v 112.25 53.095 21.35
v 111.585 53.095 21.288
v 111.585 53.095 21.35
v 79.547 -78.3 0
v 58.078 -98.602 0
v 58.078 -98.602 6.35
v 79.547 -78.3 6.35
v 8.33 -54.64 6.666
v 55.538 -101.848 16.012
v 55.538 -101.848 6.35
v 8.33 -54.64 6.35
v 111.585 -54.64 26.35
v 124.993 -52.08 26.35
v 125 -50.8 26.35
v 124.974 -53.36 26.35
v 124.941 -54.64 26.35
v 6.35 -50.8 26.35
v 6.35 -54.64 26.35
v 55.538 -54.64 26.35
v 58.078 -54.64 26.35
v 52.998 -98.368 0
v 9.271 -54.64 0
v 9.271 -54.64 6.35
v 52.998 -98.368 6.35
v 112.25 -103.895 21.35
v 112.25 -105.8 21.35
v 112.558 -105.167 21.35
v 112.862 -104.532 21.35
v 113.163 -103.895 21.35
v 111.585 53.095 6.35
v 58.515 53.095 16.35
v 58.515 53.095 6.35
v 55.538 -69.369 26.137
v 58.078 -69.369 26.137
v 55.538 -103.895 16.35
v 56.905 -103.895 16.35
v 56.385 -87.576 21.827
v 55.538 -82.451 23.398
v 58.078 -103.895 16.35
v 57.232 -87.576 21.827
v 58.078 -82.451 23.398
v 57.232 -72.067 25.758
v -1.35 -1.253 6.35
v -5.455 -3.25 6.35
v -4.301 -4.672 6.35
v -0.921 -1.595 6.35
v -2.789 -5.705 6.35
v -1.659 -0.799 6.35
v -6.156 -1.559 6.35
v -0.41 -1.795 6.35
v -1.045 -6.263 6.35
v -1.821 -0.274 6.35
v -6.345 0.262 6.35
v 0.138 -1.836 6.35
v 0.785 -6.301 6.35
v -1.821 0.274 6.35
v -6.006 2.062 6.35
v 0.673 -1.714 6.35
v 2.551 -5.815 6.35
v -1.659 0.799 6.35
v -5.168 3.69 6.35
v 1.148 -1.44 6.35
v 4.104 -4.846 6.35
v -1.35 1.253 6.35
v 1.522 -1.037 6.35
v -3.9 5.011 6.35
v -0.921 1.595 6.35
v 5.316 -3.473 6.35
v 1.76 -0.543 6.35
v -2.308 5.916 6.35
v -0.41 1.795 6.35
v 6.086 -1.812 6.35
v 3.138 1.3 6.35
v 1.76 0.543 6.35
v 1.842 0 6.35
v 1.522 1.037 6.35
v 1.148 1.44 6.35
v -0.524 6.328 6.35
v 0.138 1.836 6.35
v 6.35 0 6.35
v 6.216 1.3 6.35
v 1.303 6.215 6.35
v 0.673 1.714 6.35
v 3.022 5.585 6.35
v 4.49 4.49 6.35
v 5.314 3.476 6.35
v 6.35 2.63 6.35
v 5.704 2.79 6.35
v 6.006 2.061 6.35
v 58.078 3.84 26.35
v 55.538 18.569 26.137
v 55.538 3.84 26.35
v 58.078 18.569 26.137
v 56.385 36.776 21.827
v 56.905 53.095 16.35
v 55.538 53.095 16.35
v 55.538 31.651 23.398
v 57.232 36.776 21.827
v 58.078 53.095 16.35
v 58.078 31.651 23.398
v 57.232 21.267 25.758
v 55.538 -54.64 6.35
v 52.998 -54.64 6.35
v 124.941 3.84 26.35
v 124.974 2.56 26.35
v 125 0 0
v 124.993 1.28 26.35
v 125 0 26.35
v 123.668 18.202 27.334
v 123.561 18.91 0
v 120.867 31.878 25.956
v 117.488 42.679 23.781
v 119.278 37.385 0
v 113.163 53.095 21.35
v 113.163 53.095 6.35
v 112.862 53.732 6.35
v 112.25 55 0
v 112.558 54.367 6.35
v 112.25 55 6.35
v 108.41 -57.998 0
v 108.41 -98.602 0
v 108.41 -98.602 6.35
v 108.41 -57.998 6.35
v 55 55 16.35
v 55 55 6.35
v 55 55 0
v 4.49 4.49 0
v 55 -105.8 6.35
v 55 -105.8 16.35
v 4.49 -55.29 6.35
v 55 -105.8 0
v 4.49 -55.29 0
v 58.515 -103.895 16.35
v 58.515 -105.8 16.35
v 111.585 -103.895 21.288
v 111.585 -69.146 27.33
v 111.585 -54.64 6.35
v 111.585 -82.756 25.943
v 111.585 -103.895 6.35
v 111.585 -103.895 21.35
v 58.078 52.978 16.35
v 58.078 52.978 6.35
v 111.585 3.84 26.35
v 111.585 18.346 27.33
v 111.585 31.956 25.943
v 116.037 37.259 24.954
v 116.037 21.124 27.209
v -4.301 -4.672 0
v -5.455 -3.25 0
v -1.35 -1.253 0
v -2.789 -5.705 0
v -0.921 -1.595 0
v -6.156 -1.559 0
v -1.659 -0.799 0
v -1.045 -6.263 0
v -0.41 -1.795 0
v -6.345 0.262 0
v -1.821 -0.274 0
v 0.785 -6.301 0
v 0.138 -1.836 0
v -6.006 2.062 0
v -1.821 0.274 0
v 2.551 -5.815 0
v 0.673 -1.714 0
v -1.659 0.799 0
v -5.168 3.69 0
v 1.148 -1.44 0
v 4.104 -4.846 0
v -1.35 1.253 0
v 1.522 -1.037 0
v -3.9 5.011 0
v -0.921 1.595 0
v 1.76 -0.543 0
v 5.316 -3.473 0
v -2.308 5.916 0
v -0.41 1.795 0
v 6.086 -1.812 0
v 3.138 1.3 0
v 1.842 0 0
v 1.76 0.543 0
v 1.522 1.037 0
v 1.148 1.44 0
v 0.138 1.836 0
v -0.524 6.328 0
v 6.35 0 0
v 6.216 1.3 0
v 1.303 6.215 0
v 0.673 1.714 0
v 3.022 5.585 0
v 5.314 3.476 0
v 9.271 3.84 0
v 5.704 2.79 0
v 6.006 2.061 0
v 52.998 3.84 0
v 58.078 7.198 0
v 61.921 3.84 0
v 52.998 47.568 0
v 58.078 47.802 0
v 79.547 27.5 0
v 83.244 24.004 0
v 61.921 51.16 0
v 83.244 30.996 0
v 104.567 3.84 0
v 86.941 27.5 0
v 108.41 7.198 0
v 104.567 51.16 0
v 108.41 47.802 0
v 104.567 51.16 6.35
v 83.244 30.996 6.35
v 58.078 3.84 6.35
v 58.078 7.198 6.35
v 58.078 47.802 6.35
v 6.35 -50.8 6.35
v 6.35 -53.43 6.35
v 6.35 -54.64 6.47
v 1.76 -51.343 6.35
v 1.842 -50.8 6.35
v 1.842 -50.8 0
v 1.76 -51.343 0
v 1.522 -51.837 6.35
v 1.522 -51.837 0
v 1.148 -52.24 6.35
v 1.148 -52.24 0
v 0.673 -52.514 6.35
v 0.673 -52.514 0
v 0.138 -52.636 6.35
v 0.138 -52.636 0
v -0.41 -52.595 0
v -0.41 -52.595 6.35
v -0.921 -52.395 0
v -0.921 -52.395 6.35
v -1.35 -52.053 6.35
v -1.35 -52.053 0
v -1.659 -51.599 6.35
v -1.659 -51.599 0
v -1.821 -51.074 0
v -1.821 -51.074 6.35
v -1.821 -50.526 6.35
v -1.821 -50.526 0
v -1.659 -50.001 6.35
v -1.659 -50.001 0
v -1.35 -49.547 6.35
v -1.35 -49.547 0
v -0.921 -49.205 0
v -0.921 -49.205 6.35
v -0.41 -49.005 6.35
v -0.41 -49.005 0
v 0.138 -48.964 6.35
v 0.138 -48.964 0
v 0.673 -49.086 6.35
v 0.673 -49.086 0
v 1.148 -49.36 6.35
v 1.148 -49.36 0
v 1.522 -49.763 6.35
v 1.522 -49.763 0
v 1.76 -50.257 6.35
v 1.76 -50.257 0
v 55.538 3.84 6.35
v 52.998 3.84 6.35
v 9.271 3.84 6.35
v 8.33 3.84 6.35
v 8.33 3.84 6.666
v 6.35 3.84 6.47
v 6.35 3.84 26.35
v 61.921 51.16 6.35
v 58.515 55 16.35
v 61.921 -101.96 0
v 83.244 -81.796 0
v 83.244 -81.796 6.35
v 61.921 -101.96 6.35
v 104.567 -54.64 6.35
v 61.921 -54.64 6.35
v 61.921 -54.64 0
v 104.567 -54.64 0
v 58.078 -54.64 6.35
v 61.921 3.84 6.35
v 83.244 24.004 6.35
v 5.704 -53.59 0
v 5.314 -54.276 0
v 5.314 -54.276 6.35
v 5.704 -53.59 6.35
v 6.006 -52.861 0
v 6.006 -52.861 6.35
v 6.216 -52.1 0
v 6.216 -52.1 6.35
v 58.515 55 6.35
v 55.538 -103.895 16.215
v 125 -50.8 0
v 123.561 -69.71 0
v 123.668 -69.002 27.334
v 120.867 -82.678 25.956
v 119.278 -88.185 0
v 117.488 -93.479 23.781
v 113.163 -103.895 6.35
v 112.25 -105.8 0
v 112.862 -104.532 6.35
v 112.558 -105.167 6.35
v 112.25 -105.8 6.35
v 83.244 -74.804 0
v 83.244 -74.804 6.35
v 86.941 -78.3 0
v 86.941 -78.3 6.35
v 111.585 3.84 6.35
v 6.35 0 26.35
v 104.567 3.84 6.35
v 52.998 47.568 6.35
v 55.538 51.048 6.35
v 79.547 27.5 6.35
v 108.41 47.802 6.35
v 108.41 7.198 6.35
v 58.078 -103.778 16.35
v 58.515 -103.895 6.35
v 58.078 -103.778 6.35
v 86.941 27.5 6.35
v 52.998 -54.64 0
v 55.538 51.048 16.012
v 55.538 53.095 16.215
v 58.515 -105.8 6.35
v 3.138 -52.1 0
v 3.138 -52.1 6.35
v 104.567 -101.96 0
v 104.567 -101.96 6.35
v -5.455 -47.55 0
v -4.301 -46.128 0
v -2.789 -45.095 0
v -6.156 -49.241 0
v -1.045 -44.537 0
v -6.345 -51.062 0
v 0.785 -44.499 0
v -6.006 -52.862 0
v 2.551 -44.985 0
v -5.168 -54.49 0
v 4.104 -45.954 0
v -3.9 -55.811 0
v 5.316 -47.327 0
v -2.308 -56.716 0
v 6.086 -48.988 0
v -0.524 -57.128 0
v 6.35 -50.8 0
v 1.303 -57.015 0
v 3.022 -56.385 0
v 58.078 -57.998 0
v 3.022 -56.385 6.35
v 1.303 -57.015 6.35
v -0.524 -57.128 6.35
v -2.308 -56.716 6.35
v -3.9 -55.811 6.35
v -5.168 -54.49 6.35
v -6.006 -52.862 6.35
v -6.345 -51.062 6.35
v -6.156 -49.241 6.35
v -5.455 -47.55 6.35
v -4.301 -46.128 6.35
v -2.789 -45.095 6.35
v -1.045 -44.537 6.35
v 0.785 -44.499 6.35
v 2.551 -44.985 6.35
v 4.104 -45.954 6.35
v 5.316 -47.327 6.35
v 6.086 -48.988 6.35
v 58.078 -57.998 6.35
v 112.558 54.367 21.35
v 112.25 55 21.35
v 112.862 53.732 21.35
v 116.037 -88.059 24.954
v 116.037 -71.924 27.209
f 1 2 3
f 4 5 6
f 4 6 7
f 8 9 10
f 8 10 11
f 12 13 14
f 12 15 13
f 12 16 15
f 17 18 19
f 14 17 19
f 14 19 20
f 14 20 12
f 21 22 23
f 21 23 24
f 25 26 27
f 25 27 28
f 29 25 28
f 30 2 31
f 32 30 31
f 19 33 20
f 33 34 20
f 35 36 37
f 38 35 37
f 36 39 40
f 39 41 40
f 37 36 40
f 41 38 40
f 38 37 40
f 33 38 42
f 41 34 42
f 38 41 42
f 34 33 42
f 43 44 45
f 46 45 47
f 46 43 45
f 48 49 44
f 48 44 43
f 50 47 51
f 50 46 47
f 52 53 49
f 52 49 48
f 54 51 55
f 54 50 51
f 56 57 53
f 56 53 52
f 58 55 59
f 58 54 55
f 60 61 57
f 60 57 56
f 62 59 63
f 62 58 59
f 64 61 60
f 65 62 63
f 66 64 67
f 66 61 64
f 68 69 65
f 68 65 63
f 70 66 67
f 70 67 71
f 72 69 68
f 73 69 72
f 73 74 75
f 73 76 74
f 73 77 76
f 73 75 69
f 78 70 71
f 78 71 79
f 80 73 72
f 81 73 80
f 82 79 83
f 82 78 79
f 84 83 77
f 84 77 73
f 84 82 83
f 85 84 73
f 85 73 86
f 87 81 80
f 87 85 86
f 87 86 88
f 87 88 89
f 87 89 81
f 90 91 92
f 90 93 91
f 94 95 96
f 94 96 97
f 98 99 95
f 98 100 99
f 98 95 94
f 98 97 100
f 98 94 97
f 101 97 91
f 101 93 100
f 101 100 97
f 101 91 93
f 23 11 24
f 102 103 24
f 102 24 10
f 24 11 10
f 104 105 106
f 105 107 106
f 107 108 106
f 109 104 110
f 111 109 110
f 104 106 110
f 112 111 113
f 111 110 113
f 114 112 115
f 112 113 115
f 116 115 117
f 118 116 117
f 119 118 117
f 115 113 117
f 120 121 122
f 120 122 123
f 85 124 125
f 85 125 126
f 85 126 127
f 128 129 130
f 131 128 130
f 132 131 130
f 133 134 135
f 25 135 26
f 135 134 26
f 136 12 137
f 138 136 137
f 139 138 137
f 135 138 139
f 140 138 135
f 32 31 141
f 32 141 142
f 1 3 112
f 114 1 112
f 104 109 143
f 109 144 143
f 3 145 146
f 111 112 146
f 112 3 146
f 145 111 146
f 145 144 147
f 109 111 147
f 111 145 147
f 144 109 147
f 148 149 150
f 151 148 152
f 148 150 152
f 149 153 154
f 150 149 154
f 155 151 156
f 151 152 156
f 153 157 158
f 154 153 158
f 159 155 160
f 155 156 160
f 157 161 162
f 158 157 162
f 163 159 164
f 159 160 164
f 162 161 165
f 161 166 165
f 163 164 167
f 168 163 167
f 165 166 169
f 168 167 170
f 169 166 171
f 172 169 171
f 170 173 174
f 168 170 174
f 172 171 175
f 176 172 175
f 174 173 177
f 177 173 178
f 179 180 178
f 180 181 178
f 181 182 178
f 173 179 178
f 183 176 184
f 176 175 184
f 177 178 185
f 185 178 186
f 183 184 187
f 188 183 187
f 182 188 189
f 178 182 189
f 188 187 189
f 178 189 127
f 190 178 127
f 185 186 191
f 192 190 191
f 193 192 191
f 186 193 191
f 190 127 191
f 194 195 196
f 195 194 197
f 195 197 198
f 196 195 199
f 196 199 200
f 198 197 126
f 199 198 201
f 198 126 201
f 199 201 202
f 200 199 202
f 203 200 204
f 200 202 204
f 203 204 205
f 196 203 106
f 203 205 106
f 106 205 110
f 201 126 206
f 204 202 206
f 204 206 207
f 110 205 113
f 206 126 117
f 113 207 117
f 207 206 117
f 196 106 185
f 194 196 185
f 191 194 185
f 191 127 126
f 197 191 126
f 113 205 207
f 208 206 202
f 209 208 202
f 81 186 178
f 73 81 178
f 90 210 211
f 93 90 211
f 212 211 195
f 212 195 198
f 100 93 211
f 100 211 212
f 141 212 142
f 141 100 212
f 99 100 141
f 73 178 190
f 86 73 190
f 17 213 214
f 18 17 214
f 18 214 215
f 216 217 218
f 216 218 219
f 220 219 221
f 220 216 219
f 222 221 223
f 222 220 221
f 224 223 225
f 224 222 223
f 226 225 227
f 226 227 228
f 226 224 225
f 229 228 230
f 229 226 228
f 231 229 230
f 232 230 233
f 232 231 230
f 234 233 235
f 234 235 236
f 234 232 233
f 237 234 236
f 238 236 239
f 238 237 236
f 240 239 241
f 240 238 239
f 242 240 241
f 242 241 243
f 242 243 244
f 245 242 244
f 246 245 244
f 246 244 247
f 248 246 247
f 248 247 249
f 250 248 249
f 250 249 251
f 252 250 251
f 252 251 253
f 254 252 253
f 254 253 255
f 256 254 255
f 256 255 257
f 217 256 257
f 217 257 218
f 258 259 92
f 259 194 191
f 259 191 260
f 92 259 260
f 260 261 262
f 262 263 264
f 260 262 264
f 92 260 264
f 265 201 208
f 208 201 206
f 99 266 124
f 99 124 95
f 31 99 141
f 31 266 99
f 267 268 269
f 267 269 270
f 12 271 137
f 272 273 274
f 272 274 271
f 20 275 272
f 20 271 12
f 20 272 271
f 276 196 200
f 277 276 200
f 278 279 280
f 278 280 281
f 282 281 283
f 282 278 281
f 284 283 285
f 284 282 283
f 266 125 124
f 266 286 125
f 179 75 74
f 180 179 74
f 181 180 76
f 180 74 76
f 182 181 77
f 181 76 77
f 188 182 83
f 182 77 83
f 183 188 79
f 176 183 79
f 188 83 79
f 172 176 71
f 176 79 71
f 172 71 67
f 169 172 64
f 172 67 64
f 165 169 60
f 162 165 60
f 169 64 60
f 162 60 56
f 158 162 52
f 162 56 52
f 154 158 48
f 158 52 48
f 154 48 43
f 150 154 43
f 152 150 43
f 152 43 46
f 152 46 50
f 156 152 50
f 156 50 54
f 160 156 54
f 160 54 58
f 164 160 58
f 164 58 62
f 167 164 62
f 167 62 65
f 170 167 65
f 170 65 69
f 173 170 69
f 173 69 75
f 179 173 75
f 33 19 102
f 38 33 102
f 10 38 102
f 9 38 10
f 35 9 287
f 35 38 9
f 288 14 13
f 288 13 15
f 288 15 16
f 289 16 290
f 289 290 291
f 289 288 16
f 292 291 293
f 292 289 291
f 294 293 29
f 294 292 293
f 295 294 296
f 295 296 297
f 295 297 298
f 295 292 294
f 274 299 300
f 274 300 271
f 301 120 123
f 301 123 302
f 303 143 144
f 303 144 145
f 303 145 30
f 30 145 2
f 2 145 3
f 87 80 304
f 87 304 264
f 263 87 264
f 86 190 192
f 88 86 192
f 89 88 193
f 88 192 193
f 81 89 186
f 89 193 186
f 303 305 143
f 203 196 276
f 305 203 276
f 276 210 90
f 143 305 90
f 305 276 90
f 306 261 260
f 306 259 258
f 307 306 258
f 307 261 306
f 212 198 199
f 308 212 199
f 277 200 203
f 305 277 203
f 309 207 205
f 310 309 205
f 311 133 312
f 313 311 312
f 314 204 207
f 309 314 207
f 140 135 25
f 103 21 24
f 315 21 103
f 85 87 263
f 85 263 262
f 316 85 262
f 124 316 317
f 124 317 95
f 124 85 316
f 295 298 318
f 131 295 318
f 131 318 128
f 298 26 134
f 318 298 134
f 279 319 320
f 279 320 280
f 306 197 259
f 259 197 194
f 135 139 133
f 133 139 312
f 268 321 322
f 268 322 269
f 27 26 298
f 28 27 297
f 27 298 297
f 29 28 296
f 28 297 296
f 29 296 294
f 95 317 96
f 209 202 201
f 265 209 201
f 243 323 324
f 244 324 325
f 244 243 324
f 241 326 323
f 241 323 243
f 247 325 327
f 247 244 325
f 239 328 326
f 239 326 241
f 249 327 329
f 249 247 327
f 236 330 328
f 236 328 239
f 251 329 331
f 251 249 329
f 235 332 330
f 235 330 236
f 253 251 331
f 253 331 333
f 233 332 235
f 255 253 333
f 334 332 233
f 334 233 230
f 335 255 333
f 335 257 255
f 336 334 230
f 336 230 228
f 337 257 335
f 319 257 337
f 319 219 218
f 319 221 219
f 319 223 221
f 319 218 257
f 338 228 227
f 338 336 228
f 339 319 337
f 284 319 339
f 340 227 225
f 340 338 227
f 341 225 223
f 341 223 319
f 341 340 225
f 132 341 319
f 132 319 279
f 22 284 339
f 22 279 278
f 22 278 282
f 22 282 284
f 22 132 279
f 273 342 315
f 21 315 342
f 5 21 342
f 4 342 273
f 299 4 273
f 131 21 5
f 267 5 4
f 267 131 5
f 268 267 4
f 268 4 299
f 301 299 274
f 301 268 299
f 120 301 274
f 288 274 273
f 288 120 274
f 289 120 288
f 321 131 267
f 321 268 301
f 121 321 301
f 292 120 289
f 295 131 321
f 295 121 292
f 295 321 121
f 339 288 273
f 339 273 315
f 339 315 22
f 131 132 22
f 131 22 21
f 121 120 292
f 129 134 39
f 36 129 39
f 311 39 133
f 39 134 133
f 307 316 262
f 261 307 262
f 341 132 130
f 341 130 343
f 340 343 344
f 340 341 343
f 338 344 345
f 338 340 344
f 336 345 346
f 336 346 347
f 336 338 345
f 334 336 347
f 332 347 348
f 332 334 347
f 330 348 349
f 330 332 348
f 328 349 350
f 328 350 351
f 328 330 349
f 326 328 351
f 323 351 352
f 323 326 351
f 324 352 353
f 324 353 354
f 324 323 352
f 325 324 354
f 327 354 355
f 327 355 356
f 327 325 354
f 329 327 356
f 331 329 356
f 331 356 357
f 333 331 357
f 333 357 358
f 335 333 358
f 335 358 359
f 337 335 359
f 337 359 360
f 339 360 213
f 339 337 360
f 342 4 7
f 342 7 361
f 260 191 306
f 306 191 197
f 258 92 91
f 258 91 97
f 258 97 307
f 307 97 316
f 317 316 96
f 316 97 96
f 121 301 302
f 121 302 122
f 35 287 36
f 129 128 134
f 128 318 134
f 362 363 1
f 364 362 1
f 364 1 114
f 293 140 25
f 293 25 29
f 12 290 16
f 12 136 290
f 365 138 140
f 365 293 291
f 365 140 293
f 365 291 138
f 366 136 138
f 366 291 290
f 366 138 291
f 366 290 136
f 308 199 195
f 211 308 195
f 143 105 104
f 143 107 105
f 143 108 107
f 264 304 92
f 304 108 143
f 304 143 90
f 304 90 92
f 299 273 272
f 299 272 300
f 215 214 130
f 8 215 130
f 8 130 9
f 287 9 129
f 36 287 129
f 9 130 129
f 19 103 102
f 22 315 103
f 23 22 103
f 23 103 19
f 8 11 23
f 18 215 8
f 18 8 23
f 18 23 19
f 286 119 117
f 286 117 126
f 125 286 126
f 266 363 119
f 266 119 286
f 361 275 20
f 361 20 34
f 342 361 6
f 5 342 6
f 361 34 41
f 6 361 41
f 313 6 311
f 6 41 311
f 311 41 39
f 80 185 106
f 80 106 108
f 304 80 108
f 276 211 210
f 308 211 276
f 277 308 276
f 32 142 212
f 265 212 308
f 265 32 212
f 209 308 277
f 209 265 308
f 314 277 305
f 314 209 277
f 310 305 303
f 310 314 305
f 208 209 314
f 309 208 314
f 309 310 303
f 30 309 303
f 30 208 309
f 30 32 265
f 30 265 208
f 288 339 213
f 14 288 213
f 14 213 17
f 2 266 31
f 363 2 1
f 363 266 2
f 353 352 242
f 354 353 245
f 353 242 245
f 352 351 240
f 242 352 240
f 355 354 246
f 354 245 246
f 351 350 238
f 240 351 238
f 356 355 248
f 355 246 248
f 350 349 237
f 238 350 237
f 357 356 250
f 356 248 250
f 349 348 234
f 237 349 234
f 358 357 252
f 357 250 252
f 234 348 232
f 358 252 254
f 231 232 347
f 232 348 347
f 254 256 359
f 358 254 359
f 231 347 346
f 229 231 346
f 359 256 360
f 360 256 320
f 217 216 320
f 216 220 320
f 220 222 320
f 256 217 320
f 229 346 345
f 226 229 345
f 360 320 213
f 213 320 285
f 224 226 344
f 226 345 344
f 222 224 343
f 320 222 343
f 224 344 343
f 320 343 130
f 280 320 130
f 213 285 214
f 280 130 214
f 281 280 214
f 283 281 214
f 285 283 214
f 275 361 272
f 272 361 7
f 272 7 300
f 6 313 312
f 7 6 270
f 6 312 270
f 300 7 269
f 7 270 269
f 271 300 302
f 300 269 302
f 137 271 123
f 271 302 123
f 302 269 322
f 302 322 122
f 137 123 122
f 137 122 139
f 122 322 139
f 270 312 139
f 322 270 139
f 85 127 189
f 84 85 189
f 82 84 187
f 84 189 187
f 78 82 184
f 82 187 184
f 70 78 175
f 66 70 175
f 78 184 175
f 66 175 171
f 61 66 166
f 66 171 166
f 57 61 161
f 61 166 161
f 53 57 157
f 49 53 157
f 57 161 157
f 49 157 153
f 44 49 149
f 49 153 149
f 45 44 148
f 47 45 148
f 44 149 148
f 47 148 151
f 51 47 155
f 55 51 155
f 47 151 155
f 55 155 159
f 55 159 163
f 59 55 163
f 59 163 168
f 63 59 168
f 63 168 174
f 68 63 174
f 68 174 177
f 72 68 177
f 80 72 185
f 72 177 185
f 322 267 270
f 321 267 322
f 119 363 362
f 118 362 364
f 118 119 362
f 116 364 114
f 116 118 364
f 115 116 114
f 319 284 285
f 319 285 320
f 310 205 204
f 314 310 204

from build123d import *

# Parameters (mm, degrees)
F1_DEPTH       = 6.35
F2_R           = 1.8415
F3_DEPTH       = 25.4
F4_W           = 2.9205800795
F4_H           = 3.84
F5_DEPTH       = 20
F7_DEPTH       = 3.175
F9_DEPTH       = 1.905
F7_FACE_W      = 3.175
F7_FACE_H      = 10
F9_FACE_W      = 1.905
F9_FACE_H      = 10
F12_DEPTH      = 2.54
F16_END_RADIUS = 125
F15_W          = 3.84
F15_H          = 20
F16_REACH      = 136.0957238483
F18_DEPTH      = 15
F21_END_RADIUS = 125
F21_REACH      = 66.9646272281
F23_END_RADIUS = 125
F22_W          = 3.84
F22_H          = 20
F23_REACH      = 136.0957238483


with BuildPart() as f1:
    # F0 (on Top) → F1 (new body)
    with BuildSketch(Plane.XY):
        with BuildLine():
            Line((6.35, 0), (0, 0))
            Line((0, 0), (4.4901280605, 4.4901280605))
            ThreePointArc((4.4901280605, 4.4901280605), (-5.8666350314, -2.4300397955), (6.35, 0))
        make_face()
        with BuildLine():
            Line((4.4901280605, 4.4901280605), (0, 0))
            Line((0, 0), (6.35, 0))
            ThreePointArc((6.35, 0), (6.3162867067, 0.6534693866), (6.2155048065, 1.3))
            Line((6.2155048065, 1.3), (3.1384776311, 1.3))
            Line((3.1384776311, 1.3), (5.3142644127, 3.4757867817))
            ThreePointArc((5.3142644127, 3.4757867817), (4.9283617968, 4.0042165276), (4.4901280605, 4.4901280605))
        make_face()
        with BuildLine():
            Line((55, 55), (4.4901280605, 4.4901280605))
            ThreePointArc((4.4901280605, 4.4901280605), (4.9283617968, 4.0042165276), (5.3142644127, 3.4757867817))
            Line((5.3142644127, 3.4757867817), (55.5384776311, 53.7))
            Line((55.5384776311, 53.7), (110.9497216032, 53.7))
            Line((110.9497216032, 53.7), (110.9497216032, 1.3))
            Line((110.9497216032, 1.3), (55.5384776311, 1.3))
            Line((55.5384776311, 1.3), (6.2155048065, 1.3))
            ThreePointArc((6.2155048065, 1.3), (6.3162867067, 0.6534693866), (6.35, 0))
            Line((6.35, 0), (112.2497216032, 0))
            Line((112.2497216032, 0), (112.2497216032, 55))
            Line((112.2497216032, 55), (55, 55))
        make_face()
        with BuildLine():
            Line((55.5384776311, 53.7), (5.3142644127, 3.4757867817))
            ThreePointArc((5.3142644127, 3.4757867817), (5.8666350314, 2.4300397955), (6.2155048065, 1.3))
            Line((6.2155048065, 1.3), (55.5384776311, 1.3))
            Line((55.5384776311, 1.3), (55.5384776311, 53.7))
        make_face()
        Polygon((52.9984776311, 3.84), (9.2705800795, 3.84), (52.9984776311, 47.5678975516), align=None, mode=Mode.SUBTRACT)
        Polygon((83.2440996172, 27.5), (55.5384776311, 53.7), (55.5384776311, 1.3), align=None)
        Polygon((58.0784776311, 7.197828817), (58.0784776311, 47.802171183), (79.5473432911, 27.5), align=None, mode=Mode.SUBTRACT)
        Polygon((83.2440996172, 27.5), (55.5384776311, 1.3), (110.9497216032, 1.3), align=None)
        Polygon((104.5670003976, 3.84), (61.9211988367, 3.84), (83.2440996172, 24.0041385538), align=None, mode=Mode.SUBTRACT)
        Polygon((110.9497216032, 53.7), (55.5384776311, 53.7), (83.2440996172, 27.5), align=None)
        Polygon((83.2440996172, 30.9958614462), (61.9211988367, 51.16), (104.5670003976, 51.16), align=None, mode=Mode.SUBTRACT)
        Polygon((110.9497216032, 1.3), (110.9497216032, 53.7), (83.2440996172, 27.5), align=None)
        Polygon((108.4097216032, 7.197828817), (86.9408559432, 27.5), (108.4097216032, 47.802171183), align=None, mode=Mode.SUBTRACT)
        with BuildLine():
            Line((112.2497216032, 55), (112.2497216032, 0))
            Line((112.2497216032, 0), (125, 0))
            ThreePointArc((125, 0), (121.7707173347, 28.2292826653), (112.2497216032, 55))
        make_face()
    extrude(amount=F1_DEPTH)

    # F2 (on face) → F3 (cut)
    with BuildSketch(Plane.XY.offset(6.35)):
        Circle(F2_R)
    extrude(amount=-F3_DEPTH, mode=Mode.SUBTRACT)

    # F4 (on face) → F5 (join)
    with BuildSketch(Plane.XY.offset(6.35)):
        with Locations((7.8102900398, 1.92)):
            Rectangle(F4_W, F4_H)
    extrude(amount=F5_DEPTH)

    # F6 (on face) → F7 (join)
    with BuildSketch(Plane(origin=(0, 0, 0), x_dir=(-0.7071067812, -0.7071067812, 0), z_dir=(-0.7071067812, 0.7071067812, 0))):
        Polygon((-77.7817459305, 16.35), (-77.7817459305, 6.35), (-6.35, 6.35), align=None)
    extrude(amount=-F7_DEPTH)

    # F8 (on face) → F9 (join)
    with BuildSketch(Plane(origin=(0, 55, 0), x_dir=(-1, 0, 0), z_dir=(0, 1, 0))):
        Polygon((-112.2497216032, 21.35), (-112.2497216032, 6.35), (-58.5150640303, 6.35), (-58.5150640303, 16.35), align=None)
    extrude(amount=-F9_DEPTH)

    # F7_face (on face) → F10 section 0
    with BuildSketch(Plane(origin=(56.1225320151, 53.8774679849, 11.35), x_dir=(-0.7071067812, 0.7071067812, 0), z_dir=(0.7071067812, 0.7071067812, 0))):
        Rectangle(F7_FACE_W, F7_FACE_H)
    # F9_face (on face) → F10 section 1
    with BuildSketch(Plane(origin=(58.5150640303, 54.0475, 11.35), x_dir=(0, -1, 0), z_dir=(-1, 0, 0))):
        Rectangle(F9_FACE_W, F9_FACE_H)
    loft()

    # F11 (on face) → F12 (join)
    with BuildSketch(Plane.YZ.offset(58.0784776311)):
        with BuildLine():
            add(Edge.make_bspline(
                [(53.095, 16.35), (35.4615934193, 22.0014229417), (23.1343321502, 28.0265454203), (3.84, 26.35)],
                knots=[0, 0, 0, 0, 50.2598749004, 50.2598749004, 50.2598749004, 50.2598749004], degree=3))
            Line((3.84, 26.35), (3.84, 6.35))
            Line((3.84, 6.35), (7.197828817, 6.35))
            Line((7.197828817, 6.35), (47.802171183, 6.35))
            Line((47.802171183, 6.35), (53.095, 6.35))
            Line((53.095, 6.35), (53.095, 16.35))
        make_face()
    extrude(amount=-F12_DEPTH)


with BuildPart() as f14_1:
    # F14: instance of F1
    add(f1.part.mirror(Plane(origin=(61.5116499252, -25.4, 4.122937651), x_dir=(1, 0, 0), z_dir=(0, -1, 0))))

    # F17 (on face) → F18 (join, through all)
    with BuildSketch(Plane.XY.offset(6.35)):
        with BuildLine():
            Line((113.1632492243, -103.895), (112.2497216032, -103.895))
            Line((112.2497216032, -103.895), (112.2497216032, -105.8))
            ThreePointArc((112.2497216032, -105.8), (112.7105102046, -104.8494300565), (113.1632492243, -103.895))
        make_face()
    extrude(amount=F18_DEPTH)

    f21_end = (Plane(origin=(0, -50.8, 10.675), x_dir=(-1, 0, 0), z_dir=(0, 0, -1)) * Cylinder(F21_END_RADIUS, 552.5885115546, mode=Mode.PRIVATE)).faces().sort_by_distance((122.0049305418, -77.9992081407, 5.7463948228))[0]
    # F20 (on offset) → F21 (join, up to the whole of a round face its end follows)
    with BuildSketch(Plane(origin=(111.5847216032, 0, 0), x_dir=(0, -1, 0), z_dir=(-1, 0, 0))):
        with BuildLine():
            Line((103.895, 6.35), (103.895, 21.35))
            add(Edge.make_bspline(
                [(103.895, 21.35), (87.9248529673, 25.0397752971), (72.7827176452, 29.3548926711), (54.64, 26.35)],
                knots=[0, 0, 0, 0, 49.5081308979, 49.5081308979, 49.5081308979, 49.5081308979], degree=3))
            Line((54.64, 26.35), (54.64, 6.35))
            Line((54.64, 6.35), (103.895, 6.35))
        make_face()
    f21_long = extrude(amount=-F21_REACH, mode=Mode.PRIVATE)
    add(split(f21_long, bisect_by=f21_end, keep=Keep.BOTTOM, mode=Mode.PRIVATE))

    f23_end = (Plane(origin=(0, -50.8, 13.7255002307), x_dir=(-1, 0, 0), z_dir=(0, 0, -1)) * Cylinder(F23_END_RADIUS, 691.0373274131, mode=Mode.PRIVATE)).faces().sort_by_distance((121.7707173347, -79.0292826653, 13.7255002307))[0]
    # F22 (on face) → F23 (join, up to the whole of a round face its end follows)
    with BuildSketch(Plane.YZ.offset(9.2705800795)):
        with Locations((-52.72, 16.35)):
            Rectangle(F22_W, F22_H)
    f23_long = extrude(amount=F23_REACH, mode=Mode.PRIVATE)
    add(split(f23_long, bisect_by=f23_end, keep=Keep.BOTTOM, mode=Mode.PRIVATE))


with BuildPart() as f1_1:
    add(f1.part)

    f16_end = (Plane(origin=(0, 0, 3.175), x_dir=(-1, 0, 0), z_dir=(0, 0, -1)) * Cylinder(F16_END_RADIUS, 690.8507047952, mode=Mode.PRIVATE)).faces().sort_by_distance((121.7707173347, 28.2292826653, 3.175))[0]
    # F15 (on face) → F16 (join, up to the whole of a round face its end follows)
    with BuildSketch(Plane.YZ.offset(9.2705800795)):
        with Locations((1.92, 16.35)):
            Rectangle(F15_W, F15_H)
    f16_long = extrude(amount=F16_REACH, mode=Mode.PRIVATE)
    add(split(f16_long, bisect_by=f16_end, keep=Keep.BOTTOM, mode=Mode.PRIVATE))

    # F24: F14_1 across plane
    add(f14_1.part.mirror(Plane(origin=(61.5116499252, -25.4, 4.122937651), x_dir=(1, 0, 0), z_dir=(0, -1, 0))))


solid = Compound([f14_1.part, f1_1.part])
